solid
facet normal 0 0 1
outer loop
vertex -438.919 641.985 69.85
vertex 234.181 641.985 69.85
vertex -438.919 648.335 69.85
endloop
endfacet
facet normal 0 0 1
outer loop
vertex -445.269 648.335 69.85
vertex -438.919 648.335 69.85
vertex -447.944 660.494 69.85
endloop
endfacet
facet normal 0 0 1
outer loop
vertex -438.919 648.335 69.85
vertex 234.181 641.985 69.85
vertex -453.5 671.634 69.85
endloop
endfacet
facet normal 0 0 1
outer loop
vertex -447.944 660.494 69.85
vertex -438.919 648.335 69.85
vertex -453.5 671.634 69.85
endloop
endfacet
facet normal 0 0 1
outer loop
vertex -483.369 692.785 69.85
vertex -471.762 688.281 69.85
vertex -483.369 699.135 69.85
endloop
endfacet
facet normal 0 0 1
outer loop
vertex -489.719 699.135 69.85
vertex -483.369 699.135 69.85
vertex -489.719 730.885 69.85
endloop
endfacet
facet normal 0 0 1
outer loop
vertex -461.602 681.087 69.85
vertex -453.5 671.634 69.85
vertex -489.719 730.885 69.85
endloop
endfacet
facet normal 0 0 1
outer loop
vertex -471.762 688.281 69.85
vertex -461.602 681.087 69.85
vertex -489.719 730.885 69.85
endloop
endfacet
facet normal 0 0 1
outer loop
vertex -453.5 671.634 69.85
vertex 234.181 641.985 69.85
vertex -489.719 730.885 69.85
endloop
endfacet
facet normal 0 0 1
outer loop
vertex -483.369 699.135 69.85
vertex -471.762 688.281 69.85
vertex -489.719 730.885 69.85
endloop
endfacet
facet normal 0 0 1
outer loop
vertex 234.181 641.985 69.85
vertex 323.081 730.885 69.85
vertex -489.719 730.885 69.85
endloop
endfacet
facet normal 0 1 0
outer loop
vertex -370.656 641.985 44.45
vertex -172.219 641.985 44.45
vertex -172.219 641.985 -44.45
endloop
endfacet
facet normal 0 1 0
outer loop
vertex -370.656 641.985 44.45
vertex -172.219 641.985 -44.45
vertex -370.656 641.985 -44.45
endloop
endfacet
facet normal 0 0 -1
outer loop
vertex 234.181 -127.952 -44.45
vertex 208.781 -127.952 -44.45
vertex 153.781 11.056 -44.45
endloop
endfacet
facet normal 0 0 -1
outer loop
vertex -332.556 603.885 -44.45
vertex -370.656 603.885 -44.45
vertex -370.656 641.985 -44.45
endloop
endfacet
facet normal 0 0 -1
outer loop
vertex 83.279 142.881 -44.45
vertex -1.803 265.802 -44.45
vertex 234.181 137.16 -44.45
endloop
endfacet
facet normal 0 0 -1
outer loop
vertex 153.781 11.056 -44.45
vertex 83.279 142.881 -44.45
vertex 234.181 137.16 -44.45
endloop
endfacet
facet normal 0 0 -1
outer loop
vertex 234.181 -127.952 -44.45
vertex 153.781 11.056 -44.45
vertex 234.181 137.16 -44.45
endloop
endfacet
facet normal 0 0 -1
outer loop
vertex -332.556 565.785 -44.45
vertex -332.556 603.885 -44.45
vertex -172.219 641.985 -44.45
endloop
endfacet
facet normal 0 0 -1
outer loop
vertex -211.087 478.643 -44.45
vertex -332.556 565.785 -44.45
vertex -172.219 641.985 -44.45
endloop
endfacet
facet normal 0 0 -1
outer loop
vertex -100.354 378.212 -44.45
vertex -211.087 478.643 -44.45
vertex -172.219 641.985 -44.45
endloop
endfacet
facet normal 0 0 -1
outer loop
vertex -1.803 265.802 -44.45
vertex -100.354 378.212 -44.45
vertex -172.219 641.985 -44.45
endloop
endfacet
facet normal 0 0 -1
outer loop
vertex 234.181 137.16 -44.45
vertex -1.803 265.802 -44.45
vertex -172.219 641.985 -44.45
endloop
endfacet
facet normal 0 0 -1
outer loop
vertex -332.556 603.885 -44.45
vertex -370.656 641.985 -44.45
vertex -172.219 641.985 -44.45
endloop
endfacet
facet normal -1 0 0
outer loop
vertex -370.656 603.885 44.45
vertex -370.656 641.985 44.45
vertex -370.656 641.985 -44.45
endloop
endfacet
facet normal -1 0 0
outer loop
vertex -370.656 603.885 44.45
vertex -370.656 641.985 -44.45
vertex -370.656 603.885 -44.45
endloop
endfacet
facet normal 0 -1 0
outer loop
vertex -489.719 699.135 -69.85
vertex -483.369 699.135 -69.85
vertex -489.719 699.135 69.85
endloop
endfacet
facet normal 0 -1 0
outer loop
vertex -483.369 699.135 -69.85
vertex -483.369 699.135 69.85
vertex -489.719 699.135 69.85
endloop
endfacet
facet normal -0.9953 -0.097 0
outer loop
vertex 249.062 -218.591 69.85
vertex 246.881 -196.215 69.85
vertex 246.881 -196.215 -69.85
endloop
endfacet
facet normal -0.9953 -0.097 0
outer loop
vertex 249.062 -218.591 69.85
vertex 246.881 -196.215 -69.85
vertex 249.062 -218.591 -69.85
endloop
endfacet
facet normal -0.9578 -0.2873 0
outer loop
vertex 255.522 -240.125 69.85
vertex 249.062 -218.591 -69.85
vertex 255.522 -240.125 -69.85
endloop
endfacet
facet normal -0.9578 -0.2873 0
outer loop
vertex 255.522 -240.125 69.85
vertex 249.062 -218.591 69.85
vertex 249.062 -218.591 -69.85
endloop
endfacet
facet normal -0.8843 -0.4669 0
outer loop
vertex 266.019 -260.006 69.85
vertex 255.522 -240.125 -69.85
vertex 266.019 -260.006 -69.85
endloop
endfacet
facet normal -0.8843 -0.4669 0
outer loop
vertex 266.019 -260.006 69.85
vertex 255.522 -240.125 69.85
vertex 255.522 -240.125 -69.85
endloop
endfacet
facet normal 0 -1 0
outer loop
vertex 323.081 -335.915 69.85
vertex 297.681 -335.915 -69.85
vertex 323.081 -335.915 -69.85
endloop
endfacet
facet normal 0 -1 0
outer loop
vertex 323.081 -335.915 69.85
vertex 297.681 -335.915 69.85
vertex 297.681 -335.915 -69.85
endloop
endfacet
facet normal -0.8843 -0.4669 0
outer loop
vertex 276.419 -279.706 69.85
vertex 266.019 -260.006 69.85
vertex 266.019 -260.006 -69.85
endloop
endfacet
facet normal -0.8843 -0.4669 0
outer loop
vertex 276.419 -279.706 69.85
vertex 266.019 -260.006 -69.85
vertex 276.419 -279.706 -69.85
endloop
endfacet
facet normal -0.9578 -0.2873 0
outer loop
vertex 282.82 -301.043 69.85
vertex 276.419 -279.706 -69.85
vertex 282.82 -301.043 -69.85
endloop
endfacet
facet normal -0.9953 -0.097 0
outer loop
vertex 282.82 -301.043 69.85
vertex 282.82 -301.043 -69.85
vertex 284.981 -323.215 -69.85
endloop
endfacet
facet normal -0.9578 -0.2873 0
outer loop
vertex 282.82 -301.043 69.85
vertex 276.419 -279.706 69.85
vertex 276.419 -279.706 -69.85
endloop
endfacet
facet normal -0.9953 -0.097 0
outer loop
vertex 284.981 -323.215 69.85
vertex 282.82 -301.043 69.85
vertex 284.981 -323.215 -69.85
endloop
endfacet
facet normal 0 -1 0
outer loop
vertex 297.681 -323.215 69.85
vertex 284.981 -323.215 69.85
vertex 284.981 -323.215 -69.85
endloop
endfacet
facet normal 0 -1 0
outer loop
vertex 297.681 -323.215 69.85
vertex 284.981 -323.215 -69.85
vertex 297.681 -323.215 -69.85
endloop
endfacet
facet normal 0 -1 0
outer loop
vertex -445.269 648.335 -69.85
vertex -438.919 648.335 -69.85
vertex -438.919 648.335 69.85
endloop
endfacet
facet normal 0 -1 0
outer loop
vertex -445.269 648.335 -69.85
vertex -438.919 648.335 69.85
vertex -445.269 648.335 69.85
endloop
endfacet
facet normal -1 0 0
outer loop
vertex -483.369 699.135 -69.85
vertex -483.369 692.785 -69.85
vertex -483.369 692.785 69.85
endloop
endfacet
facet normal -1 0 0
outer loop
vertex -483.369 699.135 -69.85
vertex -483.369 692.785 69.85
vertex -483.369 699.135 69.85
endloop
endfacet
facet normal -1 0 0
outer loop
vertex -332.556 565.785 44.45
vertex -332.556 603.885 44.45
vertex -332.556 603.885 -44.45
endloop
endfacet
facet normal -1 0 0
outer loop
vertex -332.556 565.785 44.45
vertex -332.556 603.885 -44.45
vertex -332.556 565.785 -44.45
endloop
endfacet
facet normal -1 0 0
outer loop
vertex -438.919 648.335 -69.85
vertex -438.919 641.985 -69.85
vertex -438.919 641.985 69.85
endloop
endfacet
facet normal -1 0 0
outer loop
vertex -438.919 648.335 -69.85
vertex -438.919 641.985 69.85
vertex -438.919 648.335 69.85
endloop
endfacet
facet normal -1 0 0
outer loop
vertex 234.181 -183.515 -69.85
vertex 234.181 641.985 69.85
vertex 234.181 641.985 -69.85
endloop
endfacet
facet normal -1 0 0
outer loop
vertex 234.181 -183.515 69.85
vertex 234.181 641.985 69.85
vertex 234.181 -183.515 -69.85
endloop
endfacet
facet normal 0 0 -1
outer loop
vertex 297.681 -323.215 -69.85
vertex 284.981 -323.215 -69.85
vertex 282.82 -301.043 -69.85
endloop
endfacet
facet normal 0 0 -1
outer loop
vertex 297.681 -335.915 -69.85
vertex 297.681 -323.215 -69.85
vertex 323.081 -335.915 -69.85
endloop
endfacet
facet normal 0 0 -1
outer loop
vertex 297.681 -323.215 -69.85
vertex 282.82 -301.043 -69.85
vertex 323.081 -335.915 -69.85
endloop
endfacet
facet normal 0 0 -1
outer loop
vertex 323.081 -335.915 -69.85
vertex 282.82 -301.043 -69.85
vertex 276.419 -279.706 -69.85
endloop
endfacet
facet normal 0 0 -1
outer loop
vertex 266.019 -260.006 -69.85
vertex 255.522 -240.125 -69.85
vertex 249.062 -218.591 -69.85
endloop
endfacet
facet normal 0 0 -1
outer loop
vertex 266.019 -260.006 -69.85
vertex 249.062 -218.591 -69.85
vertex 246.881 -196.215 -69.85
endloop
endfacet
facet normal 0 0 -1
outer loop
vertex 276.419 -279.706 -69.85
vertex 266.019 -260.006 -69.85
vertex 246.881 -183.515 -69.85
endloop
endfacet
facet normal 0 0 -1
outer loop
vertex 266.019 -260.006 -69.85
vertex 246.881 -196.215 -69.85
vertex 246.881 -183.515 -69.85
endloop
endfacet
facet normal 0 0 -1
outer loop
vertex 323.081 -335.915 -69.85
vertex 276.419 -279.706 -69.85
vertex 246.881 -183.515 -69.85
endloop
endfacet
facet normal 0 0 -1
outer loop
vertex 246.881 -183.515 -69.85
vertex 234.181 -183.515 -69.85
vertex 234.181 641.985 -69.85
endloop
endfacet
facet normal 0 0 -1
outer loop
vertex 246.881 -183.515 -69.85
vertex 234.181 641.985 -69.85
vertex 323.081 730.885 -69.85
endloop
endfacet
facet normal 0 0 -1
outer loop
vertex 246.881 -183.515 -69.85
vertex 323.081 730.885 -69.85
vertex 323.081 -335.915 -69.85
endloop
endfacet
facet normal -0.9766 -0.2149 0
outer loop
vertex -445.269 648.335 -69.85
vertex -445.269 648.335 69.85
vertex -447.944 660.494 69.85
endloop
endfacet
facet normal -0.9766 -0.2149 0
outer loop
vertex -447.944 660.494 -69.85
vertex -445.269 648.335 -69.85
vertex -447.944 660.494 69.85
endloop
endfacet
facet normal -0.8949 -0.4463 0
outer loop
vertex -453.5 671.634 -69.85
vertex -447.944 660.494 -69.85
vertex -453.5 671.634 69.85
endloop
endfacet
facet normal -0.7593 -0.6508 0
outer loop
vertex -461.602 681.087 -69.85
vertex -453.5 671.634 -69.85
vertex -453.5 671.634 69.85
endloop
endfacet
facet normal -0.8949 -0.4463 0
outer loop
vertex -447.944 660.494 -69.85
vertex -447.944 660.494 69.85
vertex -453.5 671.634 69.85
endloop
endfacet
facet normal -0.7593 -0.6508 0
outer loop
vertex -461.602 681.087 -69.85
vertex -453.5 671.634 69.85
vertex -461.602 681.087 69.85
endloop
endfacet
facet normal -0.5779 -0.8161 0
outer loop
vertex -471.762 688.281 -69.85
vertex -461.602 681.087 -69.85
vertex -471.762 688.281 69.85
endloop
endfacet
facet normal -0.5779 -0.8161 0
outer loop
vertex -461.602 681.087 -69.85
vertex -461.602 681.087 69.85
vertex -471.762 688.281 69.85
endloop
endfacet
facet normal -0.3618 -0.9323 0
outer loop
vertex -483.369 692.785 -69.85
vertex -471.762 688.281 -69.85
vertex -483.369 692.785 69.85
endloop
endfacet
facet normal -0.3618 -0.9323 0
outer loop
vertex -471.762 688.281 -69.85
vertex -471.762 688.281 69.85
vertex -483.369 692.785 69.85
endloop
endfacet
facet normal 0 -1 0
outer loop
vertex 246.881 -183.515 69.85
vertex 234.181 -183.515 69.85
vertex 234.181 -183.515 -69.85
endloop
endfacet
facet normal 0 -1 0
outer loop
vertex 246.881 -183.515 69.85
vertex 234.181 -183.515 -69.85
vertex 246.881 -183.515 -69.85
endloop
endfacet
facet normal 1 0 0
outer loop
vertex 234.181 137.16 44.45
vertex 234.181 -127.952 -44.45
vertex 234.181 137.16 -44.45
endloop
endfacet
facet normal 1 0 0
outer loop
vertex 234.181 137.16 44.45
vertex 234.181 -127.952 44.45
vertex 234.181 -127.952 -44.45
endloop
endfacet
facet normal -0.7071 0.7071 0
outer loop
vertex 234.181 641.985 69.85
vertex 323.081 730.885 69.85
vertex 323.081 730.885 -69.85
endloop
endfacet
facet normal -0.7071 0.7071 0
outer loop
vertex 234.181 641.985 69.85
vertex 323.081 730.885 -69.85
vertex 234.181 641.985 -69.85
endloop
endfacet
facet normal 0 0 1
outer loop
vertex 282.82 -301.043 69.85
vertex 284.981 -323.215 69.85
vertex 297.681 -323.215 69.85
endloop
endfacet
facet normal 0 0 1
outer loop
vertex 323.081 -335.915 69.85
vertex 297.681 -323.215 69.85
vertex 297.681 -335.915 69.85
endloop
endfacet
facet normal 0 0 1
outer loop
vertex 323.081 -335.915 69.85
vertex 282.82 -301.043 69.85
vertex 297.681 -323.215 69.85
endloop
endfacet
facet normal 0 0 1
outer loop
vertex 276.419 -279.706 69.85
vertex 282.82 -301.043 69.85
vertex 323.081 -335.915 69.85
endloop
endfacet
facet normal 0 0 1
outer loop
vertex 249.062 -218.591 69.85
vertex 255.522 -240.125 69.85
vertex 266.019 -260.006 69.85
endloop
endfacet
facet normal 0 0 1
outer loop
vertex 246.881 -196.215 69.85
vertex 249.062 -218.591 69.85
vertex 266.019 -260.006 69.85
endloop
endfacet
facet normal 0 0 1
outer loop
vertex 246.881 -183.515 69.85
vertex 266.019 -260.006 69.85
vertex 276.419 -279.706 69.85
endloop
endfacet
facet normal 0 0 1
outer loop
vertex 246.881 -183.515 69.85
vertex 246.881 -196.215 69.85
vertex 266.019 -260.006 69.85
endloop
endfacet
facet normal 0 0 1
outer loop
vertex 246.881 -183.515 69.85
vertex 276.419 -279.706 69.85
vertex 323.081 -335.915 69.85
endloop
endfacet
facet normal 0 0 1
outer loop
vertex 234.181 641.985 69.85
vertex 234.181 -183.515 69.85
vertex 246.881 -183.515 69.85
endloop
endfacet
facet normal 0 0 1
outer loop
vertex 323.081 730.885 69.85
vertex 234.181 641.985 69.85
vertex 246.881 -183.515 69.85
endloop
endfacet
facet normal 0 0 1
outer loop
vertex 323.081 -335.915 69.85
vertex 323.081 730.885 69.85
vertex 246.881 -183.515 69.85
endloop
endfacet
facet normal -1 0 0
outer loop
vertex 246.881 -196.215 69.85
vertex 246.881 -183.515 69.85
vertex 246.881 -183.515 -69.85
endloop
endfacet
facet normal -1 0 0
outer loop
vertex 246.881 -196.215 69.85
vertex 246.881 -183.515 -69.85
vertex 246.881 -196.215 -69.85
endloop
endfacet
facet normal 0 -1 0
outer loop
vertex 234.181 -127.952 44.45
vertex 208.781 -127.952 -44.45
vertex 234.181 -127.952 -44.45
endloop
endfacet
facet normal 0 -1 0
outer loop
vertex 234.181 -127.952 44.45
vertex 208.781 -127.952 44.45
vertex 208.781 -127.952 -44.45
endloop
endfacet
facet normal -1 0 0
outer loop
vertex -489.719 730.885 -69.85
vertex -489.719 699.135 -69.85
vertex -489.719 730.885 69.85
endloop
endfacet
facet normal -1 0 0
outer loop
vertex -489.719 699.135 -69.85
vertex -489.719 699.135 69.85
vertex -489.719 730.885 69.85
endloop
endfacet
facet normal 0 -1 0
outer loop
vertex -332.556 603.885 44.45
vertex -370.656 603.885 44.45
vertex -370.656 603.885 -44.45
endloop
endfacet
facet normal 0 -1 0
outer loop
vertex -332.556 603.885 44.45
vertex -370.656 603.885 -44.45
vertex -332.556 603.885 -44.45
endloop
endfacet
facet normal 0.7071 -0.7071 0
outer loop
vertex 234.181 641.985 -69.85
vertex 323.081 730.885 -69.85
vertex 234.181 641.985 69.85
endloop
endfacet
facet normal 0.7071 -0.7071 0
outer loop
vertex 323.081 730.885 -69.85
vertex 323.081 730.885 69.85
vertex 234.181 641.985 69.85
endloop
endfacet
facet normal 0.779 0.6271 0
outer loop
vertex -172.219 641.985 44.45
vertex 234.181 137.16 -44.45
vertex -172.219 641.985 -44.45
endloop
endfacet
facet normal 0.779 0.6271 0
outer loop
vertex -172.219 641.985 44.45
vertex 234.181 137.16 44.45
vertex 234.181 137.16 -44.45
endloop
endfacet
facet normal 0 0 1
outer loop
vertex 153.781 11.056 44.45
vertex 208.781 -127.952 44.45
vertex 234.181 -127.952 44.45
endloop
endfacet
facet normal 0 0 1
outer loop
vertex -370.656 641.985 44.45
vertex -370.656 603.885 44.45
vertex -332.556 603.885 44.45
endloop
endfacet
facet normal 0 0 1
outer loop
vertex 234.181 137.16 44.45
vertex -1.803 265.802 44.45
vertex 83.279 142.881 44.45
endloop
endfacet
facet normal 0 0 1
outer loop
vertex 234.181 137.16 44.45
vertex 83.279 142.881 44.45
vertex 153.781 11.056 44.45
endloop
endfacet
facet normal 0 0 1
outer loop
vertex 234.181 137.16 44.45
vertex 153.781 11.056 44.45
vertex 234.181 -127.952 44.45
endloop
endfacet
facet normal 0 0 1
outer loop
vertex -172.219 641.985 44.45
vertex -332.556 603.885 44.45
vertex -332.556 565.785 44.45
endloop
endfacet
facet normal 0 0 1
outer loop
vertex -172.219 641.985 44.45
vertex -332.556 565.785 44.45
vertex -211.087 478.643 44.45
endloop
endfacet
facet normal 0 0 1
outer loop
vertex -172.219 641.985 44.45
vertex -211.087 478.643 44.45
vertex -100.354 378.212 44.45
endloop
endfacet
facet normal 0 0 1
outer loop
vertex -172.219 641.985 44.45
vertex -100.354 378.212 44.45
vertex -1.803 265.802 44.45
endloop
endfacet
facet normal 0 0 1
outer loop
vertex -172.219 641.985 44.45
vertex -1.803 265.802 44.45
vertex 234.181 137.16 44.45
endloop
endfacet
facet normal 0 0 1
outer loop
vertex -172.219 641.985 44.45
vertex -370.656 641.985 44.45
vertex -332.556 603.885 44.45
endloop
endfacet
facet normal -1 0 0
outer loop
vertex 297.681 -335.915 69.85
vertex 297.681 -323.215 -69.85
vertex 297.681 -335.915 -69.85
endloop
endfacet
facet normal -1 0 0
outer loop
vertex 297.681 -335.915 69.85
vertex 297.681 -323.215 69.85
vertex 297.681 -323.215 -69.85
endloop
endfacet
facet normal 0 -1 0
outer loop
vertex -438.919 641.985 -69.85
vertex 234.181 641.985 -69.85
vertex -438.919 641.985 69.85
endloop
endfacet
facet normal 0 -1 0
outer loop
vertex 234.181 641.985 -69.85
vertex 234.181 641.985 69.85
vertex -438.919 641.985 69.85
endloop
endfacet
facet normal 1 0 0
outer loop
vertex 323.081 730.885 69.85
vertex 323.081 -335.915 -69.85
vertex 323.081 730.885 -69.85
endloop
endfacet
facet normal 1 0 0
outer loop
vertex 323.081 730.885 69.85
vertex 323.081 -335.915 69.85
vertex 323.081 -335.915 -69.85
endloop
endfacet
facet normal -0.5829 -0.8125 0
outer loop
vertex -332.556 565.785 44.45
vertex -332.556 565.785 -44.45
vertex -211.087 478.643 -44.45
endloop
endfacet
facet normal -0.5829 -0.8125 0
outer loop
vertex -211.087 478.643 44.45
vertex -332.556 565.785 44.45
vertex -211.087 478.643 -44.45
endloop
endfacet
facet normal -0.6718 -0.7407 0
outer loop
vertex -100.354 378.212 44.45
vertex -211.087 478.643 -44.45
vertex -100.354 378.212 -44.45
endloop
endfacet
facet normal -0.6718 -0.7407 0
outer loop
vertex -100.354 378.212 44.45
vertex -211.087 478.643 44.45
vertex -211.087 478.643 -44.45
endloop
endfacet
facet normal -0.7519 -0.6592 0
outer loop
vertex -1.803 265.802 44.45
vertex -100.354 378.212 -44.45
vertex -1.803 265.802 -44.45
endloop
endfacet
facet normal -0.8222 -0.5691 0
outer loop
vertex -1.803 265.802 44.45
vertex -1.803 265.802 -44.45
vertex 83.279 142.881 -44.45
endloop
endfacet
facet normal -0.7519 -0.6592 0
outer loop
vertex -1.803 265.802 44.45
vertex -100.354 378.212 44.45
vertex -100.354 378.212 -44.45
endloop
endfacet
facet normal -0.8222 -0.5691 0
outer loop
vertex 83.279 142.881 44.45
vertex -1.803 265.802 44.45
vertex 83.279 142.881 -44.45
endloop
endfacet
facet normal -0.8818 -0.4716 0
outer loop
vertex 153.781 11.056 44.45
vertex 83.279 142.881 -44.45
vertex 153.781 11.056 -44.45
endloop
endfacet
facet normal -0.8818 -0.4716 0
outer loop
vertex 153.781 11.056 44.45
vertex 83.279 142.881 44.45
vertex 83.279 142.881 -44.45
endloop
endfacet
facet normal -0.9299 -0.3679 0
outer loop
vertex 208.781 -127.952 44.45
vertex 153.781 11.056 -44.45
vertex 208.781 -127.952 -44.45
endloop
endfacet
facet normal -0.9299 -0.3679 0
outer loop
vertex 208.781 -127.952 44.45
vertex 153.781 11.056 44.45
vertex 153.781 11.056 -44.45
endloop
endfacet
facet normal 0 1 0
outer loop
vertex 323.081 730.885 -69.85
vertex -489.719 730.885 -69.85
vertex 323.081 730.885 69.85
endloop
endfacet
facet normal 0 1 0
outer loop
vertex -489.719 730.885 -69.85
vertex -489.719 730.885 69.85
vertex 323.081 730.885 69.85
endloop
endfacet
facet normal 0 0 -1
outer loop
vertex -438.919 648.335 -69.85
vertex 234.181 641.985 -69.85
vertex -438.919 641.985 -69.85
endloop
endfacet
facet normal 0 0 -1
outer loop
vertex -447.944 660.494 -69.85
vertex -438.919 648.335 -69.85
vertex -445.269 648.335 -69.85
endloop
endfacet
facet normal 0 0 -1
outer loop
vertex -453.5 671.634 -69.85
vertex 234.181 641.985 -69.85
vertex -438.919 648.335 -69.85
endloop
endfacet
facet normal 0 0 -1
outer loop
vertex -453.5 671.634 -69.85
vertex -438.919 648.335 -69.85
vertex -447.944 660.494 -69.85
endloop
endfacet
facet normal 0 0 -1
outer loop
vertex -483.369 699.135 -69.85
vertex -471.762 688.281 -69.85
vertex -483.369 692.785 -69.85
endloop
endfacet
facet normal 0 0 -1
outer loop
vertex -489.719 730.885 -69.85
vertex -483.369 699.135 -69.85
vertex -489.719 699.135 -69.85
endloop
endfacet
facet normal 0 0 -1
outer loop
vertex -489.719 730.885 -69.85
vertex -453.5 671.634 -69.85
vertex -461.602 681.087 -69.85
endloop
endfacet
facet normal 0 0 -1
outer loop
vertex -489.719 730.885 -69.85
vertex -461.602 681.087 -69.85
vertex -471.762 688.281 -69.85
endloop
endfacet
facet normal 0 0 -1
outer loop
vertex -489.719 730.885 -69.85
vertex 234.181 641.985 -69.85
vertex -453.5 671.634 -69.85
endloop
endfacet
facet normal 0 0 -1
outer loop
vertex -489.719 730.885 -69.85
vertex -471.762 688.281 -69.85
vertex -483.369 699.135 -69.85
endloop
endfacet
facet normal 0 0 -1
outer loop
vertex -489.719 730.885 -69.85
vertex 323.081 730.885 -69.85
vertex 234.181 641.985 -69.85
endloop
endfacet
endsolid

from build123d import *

# Parameters (mm, degrees)
BOSS_EXTRUDE1_DEPTH = 69.85
BOSS_EXTRUDE2_DEPTH = 44.45
BOSS_EXTRUDE3_DEPTH = 69.85


with BuildPart() as part:
    # Sketch1 → Boss-Extrude1 (new body, symmetric)
    with BuildSketch(Plane.XY):
        with BuildLine():
            Line((-483.368776984, 692.785), (-483.368776984, 699.135))
            Line((-483.368776984, 699.135), (-489.718776984, 699.135))
            Line((-489.718776984, 699.135), (-489.718776984, 730.885))
            Line((-489.718776984, 730.885), (323.081223016, 730.885))
            Line((323.081223016, 730.885), (234.181223016, 641.985))
            Line((234.181223016, 641.985), (-438.918776984, 641.985))
            Line((-438.918776984, 641.985), (-438.918776984, 648.335))
            Line((-438.918776984, 648.335), (-445.268776984, 648.335))
            ThreePointArc((-445.268776984, 648.335), (-457.260423906, 676.610016924), (-483.368776984, 692.785))
        make_face()
    extrude(amount=BOSS_EXTRUDE1_DEPTH, both=True)


with BuildPart() as body_2:
    # Sketch1_3 → Boss-Extrude2 (new body, symmetric)
    with BuildSketch(Plane.XY):
        with BuildLine():
            Line((234.181223016, 137.16), (-172.218776984, 641.985))
            Line((-172.218776984, 641.985), (-370.656276984, 641.985))
            Line((-370.656276984, 641.985), (-370.656276984, 603.885))
            Line((-370.656276984, 603.885), (-332.556276984, 603.885))
            Line((-332.556276984, 603.885), (-332.556276984, 565.785))
            ThreePointArc((-332.556276984, 565.785), (-1.802905594, 265.801503762), (208.781223016, -127.9525))
            Line((208.781223016, -127.9525), (234.181223016, -127.9525))
            Line((234.181223016, -127.9525), (234.181223016, 137.16))
        make_face()
    extrude(amount=BOSS_EXTRUDE2_DEPTH, both=True)


with BuildPart() as body_3:
    # Sketch1_4 → Boss-Extrude3 (new body, symmetric)
    with BuildSketch(Plane.XY):
        with BuildLine():
            Line((323.081223016, -335.915), (323.081223016, 730.885))
            Line((323.081223016, 730.885), (234.181223016, 641.985))
            Line((234.181223016, 641.985), (234.181223016, -183.515))
            Line((234.181223016, -183.515), (246.881223016, -183.515))
            Line((246.881223016, -183.515), (246.881223016, -196.215))
            ThreePointArc((246.881223016, -196.215), (251.768629387, -229.515028089), (266.018608337, -260.006284404))
            ThreePointArc((266.018608337, -260.006284404), (280.138450492, -290.219081757), (284.981223016, -323.215))
            Line((284.981223016, -323.215), (297.681223016, -323.215))
            Line((297.681223016, -323.215), (297.681223016, -335.915))
            Line((297.681223016, -335.915), (323.081223016, -335.915))
        make_face()
    extrude(amount=BOSS_EXTRUDE3_DEPTH, both=True)


solid = Compound([part.part, body_2.part, body_3.part])
